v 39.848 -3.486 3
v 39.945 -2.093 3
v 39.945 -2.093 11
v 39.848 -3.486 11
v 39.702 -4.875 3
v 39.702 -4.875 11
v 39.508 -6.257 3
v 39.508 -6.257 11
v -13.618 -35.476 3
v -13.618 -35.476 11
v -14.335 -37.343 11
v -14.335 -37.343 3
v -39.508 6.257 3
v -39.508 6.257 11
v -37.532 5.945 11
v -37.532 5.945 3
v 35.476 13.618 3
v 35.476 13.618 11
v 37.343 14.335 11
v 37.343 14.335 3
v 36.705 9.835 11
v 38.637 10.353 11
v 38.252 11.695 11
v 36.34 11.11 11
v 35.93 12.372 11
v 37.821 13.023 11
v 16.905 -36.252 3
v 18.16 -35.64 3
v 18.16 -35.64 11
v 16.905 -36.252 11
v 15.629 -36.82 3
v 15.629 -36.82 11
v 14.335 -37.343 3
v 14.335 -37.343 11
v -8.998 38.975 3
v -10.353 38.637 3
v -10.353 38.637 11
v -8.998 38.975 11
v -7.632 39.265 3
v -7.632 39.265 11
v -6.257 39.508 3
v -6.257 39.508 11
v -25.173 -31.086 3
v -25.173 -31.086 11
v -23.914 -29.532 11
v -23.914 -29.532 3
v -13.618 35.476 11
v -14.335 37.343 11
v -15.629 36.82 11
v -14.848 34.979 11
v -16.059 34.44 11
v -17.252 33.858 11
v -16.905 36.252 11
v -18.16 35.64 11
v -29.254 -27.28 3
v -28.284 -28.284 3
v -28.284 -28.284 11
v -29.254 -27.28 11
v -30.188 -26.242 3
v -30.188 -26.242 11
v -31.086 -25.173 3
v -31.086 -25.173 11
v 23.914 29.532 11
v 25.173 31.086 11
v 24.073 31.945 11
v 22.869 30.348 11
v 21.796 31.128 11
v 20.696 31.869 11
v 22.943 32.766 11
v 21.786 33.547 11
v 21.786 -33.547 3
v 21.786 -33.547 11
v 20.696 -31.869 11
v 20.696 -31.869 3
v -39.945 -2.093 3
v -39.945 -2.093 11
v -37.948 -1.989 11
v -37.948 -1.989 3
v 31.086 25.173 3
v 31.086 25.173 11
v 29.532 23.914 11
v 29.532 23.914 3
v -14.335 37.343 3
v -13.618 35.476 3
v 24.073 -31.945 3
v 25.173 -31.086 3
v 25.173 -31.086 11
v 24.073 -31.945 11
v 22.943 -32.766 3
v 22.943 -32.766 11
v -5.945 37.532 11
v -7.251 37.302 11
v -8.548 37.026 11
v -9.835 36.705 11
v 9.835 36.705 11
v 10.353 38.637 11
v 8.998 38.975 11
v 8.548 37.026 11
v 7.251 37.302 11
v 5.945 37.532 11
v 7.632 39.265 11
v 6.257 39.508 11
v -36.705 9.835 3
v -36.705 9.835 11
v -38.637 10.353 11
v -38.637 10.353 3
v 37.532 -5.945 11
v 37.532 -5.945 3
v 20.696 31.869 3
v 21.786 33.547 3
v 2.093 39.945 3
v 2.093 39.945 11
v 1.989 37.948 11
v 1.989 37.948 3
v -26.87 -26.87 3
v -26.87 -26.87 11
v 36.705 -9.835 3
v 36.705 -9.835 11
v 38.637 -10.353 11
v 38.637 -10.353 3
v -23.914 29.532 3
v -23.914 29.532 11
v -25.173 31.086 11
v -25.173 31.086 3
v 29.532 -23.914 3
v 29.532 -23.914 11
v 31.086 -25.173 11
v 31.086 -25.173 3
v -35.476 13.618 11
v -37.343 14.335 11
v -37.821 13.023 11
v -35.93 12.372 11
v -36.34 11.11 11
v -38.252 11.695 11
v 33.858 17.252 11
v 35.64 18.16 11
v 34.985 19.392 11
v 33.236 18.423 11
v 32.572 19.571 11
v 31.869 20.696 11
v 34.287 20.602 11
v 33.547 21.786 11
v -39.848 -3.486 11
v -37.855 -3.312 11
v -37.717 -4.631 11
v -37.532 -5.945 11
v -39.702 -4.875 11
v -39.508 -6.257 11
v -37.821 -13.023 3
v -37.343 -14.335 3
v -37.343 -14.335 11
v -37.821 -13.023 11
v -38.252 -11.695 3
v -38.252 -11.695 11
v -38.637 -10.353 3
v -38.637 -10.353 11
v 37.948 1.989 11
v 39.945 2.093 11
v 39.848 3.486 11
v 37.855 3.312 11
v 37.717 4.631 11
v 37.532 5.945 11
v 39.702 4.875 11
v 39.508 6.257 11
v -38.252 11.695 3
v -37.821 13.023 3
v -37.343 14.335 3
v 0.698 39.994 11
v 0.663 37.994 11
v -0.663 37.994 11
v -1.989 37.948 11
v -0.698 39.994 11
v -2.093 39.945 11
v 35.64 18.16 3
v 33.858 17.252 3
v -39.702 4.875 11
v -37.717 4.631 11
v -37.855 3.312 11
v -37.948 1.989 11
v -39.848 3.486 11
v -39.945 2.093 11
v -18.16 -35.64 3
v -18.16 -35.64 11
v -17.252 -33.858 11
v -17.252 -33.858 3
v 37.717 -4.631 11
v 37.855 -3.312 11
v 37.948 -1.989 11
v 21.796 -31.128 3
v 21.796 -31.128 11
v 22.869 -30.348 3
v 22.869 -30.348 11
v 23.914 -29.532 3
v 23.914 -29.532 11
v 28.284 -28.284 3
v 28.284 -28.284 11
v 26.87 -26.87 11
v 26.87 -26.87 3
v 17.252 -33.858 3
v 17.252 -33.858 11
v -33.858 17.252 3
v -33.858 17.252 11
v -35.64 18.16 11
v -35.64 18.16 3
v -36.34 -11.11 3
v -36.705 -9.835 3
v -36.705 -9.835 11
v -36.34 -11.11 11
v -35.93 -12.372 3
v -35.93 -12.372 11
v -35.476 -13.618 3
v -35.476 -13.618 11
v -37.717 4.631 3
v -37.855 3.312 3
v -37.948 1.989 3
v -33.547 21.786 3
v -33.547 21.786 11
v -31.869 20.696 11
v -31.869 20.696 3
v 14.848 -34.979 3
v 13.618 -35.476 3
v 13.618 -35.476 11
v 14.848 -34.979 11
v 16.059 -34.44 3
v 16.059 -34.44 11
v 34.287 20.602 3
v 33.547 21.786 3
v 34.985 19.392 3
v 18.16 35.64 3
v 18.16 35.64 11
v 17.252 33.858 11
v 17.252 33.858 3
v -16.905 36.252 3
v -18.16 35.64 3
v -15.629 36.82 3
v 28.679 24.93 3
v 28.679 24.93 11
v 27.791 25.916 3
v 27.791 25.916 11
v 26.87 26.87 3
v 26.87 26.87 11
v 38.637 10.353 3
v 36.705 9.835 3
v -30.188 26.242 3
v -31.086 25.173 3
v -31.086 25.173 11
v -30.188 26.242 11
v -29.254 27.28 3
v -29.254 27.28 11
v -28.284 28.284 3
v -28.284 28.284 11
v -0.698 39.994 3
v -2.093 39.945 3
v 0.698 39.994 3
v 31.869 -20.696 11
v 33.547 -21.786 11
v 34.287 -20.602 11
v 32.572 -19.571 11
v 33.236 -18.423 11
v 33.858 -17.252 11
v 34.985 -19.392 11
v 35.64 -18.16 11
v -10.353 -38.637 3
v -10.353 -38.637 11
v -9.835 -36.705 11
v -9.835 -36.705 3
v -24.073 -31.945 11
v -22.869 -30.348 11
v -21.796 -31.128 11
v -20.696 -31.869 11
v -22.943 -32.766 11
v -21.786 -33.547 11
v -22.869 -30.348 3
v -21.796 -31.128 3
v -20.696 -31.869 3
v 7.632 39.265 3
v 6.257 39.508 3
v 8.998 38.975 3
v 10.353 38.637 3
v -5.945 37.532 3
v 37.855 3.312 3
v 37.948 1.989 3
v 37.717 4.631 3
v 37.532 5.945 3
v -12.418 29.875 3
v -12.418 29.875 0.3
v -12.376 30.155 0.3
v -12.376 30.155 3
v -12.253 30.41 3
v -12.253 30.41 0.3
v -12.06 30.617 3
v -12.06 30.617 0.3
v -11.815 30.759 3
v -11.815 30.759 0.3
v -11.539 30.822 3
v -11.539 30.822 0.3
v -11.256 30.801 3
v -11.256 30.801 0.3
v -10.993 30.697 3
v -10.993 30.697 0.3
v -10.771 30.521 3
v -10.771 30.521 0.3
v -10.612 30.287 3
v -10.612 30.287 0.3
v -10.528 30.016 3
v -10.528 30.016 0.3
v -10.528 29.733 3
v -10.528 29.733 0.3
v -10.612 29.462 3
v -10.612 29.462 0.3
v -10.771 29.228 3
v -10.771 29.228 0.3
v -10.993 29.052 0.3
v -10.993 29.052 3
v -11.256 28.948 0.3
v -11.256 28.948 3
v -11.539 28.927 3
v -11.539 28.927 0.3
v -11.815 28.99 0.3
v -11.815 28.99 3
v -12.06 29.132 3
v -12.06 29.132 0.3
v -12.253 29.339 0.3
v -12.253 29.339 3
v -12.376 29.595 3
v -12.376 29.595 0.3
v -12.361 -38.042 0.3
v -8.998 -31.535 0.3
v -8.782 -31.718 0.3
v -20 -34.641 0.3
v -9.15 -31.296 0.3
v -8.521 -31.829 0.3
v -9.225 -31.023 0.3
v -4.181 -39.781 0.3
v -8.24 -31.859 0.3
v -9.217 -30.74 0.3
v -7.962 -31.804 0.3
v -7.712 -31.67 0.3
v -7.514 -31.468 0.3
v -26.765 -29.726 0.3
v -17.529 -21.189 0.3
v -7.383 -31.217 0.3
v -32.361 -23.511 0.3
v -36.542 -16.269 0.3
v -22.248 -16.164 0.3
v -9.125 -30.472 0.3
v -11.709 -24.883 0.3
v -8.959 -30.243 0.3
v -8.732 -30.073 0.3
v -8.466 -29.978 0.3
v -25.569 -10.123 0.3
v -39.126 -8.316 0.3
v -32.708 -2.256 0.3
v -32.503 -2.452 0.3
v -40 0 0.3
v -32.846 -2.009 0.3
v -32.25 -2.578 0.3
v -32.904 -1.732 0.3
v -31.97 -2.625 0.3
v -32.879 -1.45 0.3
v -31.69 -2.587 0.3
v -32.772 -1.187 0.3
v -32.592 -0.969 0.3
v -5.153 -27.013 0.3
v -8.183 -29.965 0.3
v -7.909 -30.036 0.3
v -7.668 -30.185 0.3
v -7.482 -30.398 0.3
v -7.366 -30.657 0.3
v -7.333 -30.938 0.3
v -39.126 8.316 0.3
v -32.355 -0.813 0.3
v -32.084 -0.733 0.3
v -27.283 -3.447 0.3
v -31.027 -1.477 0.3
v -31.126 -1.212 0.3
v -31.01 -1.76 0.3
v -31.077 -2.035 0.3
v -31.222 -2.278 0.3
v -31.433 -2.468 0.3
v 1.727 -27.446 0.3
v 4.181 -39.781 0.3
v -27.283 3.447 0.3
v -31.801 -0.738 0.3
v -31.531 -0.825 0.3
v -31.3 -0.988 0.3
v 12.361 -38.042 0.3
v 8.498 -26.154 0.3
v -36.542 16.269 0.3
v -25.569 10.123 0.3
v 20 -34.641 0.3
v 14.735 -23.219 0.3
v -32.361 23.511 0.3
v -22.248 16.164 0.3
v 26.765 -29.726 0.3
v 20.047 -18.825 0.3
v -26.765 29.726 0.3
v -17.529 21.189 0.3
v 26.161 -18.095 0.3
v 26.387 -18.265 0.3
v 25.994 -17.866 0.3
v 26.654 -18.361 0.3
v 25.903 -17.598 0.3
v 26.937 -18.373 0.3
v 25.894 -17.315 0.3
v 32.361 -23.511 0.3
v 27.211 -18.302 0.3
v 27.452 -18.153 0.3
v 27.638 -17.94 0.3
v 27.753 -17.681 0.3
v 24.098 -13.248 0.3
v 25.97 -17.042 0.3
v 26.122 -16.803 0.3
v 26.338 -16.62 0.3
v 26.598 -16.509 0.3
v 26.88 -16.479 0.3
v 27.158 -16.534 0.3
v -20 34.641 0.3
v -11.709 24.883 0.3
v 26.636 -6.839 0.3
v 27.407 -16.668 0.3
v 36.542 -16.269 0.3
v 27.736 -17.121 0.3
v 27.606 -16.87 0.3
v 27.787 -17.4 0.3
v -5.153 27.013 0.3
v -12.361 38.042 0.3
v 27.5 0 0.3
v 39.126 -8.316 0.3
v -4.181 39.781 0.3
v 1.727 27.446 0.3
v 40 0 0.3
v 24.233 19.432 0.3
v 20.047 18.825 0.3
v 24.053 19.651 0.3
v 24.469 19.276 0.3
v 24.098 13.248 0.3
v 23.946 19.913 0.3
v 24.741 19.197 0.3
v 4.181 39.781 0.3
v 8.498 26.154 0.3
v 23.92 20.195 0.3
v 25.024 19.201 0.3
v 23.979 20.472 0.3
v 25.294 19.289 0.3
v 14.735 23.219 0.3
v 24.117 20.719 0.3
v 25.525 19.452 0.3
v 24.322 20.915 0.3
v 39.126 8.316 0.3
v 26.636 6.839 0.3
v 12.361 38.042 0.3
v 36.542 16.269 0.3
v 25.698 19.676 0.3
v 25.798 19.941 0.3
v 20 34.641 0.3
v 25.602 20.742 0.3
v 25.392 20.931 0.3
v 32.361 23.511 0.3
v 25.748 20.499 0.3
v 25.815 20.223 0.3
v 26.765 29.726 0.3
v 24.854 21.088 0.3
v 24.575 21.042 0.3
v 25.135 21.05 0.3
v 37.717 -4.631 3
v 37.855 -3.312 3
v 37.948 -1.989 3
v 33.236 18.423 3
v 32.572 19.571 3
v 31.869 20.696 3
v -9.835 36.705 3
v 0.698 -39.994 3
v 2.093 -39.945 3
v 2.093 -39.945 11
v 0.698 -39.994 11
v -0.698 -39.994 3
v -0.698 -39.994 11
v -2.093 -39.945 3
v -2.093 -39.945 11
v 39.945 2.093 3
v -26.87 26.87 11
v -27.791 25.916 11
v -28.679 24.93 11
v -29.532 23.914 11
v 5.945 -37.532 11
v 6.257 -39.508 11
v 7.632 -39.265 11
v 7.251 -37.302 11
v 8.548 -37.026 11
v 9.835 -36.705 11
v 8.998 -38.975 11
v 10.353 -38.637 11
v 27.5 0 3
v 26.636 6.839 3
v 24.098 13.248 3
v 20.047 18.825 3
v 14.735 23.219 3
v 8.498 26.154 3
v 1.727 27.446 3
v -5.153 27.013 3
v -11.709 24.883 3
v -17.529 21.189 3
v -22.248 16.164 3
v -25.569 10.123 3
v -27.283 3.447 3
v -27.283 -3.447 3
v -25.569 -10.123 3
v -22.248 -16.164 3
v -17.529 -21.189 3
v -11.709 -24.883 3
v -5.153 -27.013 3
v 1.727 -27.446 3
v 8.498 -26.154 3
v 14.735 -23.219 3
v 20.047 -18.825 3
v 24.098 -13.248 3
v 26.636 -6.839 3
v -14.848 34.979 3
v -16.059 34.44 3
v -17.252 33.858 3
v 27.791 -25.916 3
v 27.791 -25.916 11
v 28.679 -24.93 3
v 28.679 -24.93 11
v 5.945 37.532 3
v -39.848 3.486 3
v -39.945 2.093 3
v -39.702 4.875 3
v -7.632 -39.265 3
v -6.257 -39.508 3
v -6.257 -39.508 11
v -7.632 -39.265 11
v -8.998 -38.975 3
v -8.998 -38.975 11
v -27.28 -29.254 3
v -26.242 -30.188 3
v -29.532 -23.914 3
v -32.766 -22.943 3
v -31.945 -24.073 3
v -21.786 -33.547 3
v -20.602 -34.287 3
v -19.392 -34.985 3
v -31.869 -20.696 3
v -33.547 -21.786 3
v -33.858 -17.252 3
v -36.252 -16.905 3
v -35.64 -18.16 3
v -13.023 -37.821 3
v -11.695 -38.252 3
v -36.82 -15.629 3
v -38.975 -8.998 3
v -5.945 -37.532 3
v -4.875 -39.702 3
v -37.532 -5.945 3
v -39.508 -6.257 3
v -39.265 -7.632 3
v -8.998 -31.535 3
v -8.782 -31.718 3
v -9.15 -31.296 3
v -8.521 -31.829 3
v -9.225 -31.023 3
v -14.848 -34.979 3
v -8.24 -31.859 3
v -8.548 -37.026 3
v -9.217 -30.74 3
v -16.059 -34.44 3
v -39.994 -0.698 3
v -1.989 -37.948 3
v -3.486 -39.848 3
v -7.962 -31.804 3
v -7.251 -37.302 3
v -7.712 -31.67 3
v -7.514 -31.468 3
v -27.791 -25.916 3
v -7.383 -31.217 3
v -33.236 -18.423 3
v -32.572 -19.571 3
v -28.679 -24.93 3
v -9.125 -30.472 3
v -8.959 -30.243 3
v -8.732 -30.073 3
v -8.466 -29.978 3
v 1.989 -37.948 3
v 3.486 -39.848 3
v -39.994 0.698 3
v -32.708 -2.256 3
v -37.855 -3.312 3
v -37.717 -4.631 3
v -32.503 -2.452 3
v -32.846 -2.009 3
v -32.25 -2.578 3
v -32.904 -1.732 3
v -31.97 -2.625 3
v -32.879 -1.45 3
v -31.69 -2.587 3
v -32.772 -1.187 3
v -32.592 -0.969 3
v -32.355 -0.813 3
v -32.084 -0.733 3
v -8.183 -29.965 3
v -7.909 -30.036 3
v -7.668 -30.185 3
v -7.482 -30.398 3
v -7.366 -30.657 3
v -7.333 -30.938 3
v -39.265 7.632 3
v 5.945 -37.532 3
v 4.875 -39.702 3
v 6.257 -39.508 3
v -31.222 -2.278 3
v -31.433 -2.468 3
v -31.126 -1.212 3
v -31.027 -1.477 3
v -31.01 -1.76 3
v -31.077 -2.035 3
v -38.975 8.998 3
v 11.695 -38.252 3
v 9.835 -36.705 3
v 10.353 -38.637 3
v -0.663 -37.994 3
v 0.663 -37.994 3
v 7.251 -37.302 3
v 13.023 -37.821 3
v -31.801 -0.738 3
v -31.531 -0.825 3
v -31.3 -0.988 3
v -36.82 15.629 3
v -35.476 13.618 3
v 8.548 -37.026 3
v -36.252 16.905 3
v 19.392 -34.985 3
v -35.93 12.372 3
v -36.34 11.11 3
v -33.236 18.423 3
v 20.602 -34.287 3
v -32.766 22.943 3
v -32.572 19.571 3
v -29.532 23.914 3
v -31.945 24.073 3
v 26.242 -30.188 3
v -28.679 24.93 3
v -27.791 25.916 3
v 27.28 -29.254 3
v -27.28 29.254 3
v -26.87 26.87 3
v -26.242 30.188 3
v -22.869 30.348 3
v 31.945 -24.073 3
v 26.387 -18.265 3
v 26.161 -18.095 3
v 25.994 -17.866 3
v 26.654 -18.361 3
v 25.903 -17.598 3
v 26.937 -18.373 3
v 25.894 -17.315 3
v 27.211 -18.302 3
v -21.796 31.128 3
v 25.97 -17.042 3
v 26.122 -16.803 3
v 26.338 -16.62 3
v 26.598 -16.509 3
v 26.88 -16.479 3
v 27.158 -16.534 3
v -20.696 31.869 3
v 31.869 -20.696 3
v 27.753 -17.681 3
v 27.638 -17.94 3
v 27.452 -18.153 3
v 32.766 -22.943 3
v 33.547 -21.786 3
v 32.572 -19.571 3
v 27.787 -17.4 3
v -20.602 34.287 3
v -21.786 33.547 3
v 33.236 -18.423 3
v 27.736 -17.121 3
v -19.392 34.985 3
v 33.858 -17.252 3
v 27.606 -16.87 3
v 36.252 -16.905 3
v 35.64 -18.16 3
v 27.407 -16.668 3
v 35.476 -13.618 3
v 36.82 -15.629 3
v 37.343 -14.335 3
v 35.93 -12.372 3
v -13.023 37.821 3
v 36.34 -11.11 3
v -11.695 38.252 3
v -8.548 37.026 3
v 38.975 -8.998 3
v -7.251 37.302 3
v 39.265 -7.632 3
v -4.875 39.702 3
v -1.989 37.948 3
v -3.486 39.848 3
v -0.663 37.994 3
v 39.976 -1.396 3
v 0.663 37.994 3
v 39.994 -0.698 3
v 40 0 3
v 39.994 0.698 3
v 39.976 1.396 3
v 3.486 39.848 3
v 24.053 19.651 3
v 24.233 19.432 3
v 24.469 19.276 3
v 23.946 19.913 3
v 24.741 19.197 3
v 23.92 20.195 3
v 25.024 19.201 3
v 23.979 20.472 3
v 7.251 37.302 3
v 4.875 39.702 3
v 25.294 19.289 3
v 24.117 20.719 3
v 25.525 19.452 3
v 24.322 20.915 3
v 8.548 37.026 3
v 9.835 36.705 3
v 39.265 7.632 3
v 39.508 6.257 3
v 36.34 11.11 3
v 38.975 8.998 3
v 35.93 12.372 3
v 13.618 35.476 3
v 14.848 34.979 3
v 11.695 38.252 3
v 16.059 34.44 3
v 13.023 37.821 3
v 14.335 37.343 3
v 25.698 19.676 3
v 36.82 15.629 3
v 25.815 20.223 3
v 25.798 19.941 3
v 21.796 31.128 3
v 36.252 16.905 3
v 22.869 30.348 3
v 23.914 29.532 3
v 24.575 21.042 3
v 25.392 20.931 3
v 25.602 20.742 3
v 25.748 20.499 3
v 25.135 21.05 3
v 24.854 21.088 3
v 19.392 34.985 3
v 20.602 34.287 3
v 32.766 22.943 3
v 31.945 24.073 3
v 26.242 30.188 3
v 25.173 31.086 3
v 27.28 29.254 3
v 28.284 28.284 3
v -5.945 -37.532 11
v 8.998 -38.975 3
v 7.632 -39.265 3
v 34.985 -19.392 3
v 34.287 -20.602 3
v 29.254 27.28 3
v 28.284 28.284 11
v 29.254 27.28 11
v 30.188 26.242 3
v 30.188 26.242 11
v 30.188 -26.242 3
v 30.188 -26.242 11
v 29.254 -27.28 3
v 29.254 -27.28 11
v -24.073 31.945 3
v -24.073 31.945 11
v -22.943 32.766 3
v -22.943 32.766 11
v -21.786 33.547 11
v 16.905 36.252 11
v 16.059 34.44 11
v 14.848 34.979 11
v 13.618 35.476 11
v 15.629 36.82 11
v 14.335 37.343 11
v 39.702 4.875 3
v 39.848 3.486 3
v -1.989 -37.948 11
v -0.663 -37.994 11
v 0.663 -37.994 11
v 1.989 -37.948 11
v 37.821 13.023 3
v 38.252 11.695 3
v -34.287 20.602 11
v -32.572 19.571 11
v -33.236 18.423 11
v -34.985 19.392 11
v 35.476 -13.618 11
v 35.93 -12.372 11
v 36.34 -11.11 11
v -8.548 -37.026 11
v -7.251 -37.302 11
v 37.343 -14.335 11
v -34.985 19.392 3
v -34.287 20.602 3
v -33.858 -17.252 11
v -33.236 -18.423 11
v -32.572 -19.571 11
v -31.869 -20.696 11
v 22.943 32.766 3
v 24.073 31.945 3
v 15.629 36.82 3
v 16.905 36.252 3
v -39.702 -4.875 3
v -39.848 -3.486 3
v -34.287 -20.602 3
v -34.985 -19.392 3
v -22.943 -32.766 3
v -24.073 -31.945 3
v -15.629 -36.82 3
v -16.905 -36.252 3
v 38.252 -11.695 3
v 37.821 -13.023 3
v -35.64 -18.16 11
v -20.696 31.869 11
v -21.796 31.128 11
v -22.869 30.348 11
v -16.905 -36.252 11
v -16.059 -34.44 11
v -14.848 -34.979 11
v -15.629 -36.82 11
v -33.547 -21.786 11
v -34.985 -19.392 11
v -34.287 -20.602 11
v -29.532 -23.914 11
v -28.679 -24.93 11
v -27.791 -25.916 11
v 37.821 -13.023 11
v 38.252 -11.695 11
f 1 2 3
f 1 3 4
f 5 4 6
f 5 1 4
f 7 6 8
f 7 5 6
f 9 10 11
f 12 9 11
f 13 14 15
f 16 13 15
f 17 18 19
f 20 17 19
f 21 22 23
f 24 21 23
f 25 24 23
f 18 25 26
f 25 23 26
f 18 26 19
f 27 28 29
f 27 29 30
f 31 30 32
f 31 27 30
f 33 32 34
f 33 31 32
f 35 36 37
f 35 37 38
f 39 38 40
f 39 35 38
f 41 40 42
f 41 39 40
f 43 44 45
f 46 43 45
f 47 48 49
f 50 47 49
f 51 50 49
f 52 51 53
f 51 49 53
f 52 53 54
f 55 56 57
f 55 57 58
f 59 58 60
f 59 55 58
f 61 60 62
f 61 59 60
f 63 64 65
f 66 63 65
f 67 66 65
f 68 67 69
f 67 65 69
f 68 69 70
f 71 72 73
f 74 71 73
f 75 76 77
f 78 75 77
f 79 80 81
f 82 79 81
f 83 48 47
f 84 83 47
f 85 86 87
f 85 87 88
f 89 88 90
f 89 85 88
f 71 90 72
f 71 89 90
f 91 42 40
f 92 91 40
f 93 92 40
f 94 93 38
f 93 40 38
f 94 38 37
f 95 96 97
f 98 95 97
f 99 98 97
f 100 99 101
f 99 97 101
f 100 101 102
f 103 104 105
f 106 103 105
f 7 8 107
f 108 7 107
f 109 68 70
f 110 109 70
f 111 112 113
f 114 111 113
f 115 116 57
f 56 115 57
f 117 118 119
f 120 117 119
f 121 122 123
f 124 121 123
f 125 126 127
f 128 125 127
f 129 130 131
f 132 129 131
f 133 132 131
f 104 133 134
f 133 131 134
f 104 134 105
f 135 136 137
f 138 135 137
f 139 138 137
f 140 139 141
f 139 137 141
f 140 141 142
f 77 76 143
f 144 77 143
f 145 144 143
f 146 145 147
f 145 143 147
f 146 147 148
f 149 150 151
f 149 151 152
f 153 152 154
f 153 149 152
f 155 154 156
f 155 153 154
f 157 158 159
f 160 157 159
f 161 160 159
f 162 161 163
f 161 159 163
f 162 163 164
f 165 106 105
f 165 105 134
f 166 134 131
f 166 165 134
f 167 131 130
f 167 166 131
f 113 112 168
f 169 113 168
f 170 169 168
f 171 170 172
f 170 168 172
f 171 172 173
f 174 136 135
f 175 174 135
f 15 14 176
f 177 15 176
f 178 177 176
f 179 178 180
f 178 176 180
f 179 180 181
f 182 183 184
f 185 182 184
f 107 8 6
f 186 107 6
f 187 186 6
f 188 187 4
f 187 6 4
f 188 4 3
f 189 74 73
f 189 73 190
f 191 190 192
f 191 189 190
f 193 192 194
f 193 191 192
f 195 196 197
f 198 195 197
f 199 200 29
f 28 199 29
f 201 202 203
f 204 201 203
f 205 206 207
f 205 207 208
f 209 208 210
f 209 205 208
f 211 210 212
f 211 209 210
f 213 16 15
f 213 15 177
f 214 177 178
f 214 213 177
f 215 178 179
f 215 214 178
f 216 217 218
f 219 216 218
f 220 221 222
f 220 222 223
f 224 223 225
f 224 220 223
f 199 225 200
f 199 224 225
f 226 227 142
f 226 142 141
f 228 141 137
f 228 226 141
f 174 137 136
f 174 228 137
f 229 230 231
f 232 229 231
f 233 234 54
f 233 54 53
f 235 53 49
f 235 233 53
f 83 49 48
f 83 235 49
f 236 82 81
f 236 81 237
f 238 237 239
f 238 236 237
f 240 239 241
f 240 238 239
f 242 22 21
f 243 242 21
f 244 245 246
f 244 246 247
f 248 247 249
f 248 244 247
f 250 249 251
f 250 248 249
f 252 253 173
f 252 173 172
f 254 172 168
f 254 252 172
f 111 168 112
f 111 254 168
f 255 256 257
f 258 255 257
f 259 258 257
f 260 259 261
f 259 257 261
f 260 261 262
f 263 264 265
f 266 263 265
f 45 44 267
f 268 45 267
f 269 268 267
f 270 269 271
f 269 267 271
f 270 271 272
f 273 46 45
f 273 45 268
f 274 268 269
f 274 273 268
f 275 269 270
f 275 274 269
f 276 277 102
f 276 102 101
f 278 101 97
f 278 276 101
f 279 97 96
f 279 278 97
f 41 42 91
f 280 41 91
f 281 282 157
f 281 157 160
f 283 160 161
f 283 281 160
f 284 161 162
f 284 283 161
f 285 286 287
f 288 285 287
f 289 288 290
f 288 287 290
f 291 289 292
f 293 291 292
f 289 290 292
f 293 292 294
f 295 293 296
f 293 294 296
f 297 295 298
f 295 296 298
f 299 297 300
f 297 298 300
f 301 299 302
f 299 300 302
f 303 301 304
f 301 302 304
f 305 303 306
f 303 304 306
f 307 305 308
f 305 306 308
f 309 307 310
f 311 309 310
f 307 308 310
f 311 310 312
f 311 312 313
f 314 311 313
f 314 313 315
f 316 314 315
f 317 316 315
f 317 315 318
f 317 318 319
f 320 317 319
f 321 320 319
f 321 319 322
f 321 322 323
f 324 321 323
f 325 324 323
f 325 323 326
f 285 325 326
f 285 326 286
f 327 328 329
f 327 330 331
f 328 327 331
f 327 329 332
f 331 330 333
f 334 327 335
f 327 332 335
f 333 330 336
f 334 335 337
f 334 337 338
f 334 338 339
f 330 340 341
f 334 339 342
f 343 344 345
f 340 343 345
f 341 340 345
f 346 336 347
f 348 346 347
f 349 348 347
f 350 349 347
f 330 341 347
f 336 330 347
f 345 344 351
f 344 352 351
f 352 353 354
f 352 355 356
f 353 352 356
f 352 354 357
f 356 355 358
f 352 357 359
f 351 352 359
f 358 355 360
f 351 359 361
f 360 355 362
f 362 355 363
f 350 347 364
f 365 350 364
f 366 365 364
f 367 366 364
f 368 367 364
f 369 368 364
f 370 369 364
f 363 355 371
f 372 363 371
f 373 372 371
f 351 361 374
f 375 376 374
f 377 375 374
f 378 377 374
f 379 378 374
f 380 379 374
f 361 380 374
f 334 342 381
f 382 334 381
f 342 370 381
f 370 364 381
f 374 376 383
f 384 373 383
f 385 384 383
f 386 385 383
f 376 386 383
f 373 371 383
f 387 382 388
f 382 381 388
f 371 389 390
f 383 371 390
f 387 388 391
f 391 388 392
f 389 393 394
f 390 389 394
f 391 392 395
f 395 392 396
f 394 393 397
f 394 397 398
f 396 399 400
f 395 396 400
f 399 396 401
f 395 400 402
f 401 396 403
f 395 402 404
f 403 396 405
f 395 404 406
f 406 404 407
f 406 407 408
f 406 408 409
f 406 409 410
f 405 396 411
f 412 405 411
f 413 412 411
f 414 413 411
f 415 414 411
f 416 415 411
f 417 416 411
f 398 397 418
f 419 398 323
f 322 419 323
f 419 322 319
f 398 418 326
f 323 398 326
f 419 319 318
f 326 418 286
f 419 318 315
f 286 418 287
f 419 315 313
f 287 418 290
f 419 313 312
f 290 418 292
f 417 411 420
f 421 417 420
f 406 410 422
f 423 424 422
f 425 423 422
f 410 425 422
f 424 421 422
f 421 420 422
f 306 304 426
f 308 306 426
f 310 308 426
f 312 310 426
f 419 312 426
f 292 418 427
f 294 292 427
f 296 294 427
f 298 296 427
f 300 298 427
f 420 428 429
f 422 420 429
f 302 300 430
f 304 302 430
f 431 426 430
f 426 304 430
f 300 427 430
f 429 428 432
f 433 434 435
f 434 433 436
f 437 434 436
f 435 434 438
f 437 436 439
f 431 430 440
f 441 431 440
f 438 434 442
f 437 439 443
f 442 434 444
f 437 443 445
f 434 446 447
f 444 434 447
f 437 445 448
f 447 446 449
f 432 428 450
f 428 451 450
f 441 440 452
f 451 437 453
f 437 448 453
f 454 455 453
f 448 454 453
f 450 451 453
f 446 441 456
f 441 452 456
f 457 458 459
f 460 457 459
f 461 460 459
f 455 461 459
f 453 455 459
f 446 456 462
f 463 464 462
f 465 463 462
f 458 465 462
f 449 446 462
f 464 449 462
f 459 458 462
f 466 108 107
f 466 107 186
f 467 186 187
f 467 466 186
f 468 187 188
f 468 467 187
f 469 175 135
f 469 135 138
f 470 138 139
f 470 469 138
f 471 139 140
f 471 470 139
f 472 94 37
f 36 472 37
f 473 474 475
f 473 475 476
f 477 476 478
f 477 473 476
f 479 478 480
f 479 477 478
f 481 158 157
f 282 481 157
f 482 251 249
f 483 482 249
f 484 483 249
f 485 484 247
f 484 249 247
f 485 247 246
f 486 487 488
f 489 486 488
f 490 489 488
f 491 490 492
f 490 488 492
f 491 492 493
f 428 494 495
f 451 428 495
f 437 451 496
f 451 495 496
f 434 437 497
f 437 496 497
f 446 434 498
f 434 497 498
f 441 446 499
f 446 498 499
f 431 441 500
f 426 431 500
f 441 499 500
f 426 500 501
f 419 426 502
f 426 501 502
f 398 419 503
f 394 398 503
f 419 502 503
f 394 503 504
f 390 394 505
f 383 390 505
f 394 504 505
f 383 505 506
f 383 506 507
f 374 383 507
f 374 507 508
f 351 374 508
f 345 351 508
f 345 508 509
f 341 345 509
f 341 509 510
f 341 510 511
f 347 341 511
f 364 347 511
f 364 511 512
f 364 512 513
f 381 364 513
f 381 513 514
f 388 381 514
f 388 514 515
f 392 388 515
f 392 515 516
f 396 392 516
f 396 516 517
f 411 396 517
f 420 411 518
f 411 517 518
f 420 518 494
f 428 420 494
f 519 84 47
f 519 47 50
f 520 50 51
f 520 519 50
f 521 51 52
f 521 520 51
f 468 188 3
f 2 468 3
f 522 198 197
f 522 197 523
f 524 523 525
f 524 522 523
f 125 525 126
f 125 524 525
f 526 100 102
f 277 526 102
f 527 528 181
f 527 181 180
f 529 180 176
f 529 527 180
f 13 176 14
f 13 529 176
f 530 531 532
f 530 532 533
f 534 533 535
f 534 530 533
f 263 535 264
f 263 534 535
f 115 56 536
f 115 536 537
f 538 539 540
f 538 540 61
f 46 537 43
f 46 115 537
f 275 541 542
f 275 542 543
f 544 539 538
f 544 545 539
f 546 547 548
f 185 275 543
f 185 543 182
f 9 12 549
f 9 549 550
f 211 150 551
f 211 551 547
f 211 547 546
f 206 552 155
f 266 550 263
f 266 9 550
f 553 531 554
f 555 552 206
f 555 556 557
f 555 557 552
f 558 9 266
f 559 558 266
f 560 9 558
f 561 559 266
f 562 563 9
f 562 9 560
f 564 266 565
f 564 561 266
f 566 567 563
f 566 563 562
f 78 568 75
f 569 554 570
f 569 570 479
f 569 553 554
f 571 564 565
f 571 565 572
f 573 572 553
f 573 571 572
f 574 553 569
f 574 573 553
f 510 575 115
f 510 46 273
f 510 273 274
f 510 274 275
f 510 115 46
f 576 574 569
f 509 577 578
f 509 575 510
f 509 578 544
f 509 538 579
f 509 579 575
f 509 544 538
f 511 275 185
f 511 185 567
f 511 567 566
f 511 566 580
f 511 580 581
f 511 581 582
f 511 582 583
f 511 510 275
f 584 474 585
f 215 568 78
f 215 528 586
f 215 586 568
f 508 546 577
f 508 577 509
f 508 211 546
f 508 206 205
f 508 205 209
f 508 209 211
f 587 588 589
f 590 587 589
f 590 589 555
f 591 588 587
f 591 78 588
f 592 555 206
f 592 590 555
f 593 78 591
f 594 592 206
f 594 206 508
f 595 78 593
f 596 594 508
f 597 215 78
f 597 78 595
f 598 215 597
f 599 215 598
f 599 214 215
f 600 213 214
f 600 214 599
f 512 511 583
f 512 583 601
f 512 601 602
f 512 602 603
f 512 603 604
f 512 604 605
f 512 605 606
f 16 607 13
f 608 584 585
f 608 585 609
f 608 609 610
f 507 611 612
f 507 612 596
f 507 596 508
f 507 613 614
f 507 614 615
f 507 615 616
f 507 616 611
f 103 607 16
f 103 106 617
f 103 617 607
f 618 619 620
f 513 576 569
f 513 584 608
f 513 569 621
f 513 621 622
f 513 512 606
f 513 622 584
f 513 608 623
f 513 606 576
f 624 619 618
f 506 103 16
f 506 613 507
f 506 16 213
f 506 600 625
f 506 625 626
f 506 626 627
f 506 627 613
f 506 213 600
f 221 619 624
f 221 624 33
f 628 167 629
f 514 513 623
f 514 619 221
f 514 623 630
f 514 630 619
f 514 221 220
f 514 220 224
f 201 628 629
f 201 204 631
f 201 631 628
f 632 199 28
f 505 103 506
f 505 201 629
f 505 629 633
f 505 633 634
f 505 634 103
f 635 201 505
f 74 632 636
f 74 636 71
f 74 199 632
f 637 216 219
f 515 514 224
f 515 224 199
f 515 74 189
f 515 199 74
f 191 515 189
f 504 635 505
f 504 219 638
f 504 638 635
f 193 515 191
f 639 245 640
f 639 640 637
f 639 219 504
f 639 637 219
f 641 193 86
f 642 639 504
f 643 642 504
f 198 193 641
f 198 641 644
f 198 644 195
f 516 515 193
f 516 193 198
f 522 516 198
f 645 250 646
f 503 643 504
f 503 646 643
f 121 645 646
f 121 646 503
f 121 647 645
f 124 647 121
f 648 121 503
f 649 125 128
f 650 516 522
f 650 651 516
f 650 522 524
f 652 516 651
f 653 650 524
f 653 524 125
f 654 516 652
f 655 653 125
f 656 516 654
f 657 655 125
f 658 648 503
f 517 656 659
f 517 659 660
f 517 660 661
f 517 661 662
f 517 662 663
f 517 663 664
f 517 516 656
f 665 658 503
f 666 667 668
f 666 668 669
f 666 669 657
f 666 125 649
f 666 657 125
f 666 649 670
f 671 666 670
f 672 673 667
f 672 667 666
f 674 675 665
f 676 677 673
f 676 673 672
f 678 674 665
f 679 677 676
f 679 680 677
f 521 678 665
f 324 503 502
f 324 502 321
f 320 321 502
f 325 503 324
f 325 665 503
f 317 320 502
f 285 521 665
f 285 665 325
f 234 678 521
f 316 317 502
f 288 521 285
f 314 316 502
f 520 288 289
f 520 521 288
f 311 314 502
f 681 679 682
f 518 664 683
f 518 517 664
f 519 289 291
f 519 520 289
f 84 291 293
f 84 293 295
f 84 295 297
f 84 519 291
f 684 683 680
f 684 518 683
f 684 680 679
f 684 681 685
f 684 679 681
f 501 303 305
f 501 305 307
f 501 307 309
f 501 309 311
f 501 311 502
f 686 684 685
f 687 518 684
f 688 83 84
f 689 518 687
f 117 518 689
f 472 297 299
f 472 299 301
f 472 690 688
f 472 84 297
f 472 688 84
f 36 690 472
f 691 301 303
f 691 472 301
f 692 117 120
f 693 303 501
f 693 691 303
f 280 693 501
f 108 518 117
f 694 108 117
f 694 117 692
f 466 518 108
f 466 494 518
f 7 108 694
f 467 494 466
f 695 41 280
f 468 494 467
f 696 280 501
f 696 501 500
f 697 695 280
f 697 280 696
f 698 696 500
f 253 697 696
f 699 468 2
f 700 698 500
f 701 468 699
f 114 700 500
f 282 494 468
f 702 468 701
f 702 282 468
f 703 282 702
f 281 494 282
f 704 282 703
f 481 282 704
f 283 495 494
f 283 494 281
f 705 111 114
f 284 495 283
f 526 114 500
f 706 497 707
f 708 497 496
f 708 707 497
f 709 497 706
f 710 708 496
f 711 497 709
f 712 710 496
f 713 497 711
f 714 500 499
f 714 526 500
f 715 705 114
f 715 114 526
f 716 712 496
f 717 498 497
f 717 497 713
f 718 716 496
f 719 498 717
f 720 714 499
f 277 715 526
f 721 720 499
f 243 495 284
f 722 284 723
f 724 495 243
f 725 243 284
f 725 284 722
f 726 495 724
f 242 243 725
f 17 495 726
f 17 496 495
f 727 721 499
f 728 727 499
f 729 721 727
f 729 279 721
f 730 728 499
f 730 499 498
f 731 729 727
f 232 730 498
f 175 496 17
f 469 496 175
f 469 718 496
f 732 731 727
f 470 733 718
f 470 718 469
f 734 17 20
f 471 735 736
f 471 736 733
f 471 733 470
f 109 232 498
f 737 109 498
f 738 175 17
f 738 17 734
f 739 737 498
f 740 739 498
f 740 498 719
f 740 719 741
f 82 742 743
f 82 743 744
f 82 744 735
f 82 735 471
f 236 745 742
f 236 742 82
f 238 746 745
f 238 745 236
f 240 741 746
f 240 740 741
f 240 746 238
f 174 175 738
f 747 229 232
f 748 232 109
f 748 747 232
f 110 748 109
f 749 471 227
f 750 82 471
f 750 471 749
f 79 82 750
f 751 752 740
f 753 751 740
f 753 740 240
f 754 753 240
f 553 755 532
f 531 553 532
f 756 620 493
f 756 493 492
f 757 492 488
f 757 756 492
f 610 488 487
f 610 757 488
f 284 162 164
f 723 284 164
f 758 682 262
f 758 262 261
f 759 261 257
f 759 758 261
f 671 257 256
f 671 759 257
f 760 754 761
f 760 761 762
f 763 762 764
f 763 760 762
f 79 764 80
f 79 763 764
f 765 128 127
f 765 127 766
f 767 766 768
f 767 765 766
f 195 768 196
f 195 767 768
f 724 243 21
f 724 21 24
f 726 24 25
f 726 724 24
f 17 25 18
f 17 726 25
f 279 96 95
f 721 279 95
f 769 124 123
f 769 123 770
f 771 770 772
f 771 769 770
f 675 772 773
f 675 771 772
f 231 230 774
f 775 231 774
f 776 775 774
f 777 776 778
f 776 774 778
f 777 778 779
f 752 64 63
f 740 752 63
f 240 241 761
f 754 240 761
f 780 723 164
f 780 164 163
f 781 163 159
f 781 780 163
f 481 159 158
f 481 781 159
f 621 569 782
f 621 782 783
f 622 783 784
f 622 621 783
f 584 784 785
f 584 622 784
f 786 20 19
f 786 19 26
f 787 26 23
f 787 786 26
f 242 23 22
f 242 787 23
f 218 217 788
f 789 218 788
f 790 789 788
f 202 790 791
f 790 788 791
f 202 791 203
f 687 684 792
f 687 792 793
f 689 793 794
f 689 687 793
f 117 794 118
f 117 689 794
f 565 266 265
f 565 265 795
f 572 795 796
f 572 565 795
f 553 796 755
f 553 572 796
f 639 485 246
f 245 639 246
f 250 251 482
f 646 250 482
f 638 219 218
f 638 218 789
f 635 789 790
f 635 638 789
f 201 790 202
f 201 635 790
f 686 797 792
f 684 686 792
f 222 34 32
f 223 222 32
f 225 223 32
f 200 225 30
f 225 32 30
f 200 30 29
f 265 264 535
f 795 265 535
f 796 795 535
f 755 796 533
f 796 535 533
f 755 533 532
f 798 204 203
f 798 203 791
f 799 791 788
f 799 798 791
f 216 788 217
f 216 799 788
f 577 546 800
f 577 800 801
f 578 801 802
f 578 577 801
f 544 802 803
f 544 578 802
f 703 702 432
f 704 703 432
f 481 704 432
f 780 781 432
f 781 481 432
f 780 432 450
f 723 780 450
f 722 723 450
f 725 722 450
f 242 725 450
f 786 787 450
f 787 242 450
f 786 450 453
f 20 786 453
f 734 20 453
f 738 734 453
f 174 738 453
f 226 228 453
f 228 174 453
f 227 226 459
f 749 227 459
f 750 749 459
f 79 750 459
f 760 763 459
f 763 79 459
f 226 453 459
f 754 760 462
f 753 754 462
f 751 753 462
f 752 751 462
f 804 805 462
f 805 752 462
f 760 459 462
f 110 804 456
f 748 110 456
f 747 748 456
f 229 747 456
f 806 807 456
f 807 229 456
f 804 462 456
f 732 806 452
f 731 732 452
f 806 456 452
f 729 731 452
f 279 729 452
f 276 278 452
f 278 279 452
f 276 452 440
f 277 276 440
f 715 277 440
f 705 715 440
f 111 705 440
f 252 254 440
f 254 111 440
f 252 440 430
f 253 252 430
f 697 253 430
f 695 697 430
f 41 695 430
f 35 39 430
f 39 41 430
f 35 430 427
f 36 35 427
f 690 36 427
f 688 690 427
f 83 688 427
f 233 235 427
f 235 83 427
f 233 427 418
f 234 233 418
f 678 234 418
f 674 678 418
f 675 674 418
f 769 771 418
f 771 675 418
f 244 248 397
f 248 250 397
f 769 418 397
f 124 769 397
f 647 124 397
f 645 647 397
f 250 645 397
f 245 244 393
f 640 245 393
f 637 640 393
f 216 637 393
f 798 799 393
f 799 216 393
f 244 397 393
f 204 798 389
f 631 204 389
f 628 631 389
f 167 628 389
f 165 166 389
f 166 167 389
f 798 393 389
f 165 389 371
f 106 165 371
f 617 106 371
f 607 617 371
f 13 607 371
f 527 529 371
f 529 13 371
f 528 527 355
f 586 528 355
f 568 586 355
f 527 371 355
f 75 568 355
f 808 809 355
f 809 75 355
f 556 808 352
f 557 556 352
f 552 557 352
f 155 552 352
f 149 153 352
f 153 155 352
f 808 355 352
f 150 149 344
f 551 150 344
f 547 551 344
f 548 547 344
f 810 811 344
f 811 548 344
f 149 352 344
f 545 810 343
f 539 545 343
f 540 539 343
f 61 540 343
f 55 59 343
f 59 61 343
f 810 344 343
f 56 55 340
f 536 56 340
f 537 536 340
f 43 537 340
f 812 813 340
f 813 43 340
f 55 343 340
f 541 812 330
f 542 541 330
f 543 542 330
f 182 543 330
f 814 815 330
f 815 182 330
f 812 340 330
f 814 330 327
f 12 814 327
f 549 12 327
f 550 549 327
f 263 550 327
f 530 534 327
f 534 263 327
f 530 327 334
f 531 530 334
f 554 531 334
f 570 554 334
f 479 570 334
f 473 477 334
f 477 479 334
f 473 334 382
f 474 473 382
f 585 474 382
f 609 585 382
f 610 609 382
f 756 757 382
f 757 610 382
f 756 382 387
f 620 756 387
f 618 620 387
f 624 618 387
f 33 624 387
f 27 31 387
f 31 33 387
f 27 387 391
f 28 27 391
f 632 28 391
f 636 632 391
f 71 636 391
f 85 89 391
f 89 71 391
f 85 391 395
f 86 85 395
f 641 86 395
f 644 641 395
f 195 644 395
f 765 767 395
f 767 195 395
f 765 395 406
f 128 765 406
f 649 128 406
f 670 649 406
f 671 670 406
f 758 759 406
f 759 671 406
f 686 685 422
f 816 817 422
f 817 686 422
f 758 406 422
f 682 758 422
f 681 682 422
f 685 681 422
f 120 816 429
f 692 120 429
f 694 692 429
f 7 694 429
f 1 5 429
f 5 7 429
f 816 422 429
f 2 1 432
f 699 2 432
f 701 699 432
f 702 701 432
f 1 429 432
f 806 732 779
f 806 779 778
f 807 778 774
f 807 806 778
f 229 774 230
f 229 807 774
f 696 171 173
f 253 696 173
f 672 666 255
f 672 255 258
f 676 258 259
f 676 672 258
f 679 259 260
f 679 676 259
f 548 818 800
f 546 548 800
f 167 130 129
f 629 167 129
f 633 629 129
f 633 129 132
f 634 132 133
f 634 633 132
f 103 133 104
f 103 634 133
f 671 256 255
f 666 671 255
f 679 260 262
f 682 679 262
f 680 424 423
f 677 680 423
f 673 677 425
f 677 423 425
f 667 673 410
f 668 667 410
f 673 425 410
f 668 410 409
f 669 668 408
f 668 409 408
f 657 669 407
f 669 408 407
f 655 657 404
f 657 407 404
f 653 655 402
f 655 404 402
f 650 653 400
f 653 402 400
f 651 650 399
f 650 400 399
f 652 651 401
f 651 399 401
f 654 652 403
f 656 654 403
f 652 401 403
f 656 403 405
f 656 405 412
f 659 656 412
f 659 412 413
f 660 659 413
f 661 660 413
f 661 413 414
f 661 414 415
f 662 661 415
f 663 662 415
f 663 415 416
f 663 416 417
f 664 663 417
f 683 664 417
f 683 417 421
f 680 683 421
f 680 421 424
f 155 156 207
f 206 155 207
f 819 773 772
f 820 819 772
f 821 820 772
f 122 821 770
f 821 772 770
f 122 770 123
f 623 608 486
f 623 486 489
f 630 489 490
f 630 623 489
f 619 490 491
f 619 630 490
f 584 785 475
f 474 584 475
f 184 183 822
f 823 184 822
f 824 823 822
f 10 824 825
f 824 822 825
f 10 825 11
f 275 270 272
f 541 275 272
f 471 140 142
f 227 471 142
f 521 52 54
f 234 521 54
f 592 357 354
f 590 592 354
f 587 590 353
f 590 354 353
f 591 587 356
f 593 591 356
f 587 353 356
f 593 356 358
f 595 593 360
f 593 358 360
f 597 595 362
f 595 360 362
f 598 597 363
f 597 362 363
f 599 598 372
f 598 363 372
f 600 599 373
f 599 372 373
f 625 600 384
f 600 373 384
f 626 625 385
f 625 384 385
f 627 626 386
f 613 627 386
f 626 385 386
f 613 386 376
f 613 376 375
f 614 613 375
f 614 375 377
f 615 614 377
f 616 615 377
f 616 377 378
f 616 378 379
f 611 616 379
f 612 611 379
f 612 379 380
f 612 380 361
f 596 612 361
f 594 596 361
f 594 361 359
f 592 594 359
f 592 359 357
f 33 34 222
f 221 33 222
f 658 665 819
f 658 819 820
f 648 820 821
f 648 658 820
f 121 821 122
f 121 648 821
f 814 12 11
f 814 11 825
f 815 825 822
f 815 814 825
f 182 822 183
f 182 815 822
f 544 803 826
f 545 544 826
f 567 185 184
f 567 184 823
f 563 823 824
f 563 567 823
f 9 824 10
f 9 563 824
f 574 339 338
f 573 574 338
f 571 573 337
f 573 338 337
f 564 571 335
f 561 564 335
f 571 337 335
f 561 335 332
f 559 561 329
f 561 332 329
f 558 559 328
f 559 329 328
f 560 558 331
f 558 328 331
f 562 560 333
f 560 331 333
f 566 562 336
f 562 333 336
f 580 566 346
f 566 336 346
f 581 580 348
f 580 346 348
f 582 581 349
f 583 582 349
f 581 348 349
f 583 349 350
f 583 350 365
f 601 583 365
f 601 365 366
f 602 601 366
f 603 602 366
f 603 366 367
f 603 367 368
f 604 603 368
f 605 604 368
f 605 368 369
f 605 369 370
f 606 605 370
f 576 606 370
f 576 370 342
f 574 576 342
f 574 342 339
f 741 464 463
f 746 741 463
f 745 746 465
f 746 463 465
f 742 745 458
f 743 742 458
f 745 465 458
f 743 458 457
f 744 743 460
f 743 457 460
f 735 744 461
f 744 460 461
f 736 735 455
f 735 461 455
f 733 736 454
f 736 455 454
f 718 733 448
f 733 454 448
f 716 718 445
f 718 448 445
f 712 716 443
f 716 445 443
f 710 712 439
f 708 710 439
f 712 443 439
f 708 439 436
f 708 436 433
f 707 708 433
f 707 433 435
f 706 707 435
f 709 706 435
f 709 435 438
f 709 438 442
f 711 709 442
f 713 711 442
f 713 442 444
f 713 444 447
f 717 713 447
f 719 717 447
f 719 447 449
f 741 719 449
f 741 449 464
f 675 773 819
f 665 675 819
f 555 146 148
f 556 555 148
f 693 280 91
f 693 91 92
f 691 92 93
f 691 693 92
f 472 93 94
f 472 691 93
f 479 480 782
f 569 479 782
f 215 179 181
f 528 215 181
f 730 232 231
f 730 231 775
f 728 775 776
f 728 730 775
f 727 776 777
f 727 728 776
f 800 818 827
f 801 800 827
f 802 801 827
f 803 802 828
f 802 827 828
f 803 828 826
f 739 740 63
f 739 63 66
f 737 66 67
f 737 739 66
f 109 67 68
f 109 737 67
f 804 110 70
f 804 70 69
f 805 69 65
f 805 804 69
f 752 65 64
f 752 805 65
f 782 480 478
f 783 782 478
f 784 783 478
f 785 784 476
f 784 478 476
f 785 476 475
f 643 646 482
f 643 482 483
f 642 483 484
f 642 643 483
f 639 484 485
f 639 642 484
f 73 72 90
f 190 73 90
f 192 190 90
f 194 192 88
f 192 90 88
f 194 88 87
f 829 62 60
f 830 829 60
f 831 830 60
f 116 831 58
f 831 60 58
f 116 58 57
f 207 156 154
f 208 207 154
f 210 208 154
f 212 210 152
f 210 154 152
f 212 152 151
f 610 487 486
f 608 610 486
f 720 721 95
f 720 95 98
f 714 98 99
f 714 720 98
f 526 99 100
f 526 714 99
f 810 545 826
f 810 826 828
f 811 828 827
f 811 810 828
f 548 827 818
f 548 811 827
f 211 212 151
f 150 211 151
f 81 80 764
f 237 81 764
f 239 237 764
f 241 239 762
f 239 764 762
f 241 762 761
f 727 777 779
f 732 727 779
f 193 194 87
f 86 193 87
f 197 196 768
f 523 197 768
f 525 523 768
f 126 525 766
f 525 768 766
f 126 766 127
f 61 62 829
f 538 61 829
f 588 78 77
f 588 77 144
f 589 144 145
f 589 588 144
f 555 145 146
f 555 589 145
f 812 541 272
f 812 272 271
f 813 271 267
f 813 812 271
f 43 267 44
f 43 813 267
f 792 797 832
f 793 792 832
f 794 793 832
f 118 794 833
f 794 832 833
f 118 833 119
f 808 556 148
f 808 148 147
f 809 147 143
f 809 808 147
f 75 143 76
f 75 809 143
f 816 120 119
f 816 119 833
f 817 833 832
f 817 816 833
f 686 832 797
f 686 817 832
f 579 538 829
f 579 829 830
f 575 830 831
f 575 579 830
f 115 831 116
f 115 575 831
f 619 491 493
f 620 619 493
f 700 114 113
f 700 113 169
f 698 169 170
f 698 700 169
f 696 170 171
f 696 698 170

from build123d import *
from build123d.topology import SkipClean

# Parameters (mm, degrees)
SKETCH1_R           = 40
BOSS_EXTRUDE1_DEPTH = 3
SKETCH2_R           = 27.5
CUT_EXTRUDE1_DEPTH  = 57.648036153
MOVE_FACE1_BY       = 0.3
SKETCH6_R           = 0.95
CUT_EXTRUDE8_DEPTH  = 57.632940944
CIRPATTERN3_COUNT   = 5
BOSS_EXTRUDE2_DEPTH = 8
CIRPATTERN4_COUNT   = 30


with BuildPart() as part:
    # Sketch1 → Boss-Extrude1 (new body)
    with BuildSketch(Plane.XY):
        Circle(SKETCH1_R)
    extrude(amount=BOSS_EXTRUDE1_DEPTH)

    # Sketch2 → Cut-Extrude1 (cut, through all)
    with BuildSketch(Plane.XY.offset(3)):
        Circle(SKETCH2_R)
    extrude(amount=-CUT_EXTRUDE1_DEPTH, mode=Mode.SUBTRACT)

    # Move Face1: a face moved inward by 0.3
    extrude(part.faces().sort_by_distance((0, -32, 0))[0], amount=MOVE_FACE1_BY, dir=(0, 0, 1), mode=Mode.SUBTRACT)

    # Sketch6 → Cut-Extrude8 (cut, through all)
    with BuildSketch(Plane(origin=(0, 0, 0.3), x_dir=(-1, 0, 0), z_dir=(0, 0, -1))):
        with Locations((11.467774385, 29.874573648)):
            Circle(SKETCH6_R)
    cut_extrude8 = extrude(amount=-CUT_EXTRUDE8_DEPTH, mode=Mode.SUBTRACT)

    # CirPattern3: Cut-Extrude8 ×5 about axis
    cirpattern3_axis = Axis((0, 0, -88.99), (0, 0, 1))
    for i in range(1, CIRPATTERN3_COUNT):
        add(cut_extrude8.rotate(cirpattern3_axis, i * 360 / CIRPATTERN3_COUNT), mode=Mode.SUBTRACT)

    # Sketch7 → Boss-Extrude2 (add)
    with SkipClean():  # the faces are left unmerged after this step: merging them gives an invalid solid
        with BuildSketch(Plane.XY.offset(3)):
            with BuildLine():
                Line((-1.988766337, 37.947922321), (-2.09343825, 39.94518139))
                ThreePointArc((-2.09343825, 39.94518139), (0, 40), (2.09343825, 39.94518139))
                Line((2.09343825, 39.94518139), (1.988766337, 37.947922321))
                ThreePointArc((1.988766337, 37.947922321), (0, 38), (-1.988766337, 37.947922321))
            make_face()
        boss_extrude2 = extrude(amount=BOSS_EXTRUDE2_DEPTH)

    # CirPattern4: Boss-Extrude2 ×30 about axis
    with SkipClean():  # the faces are left unmerged after this step: merging them gives an invalid solid
        cirpattern4_axis = Axis((0, 0, -88.99), (0, 0, 1))
        for i in range(1, CIRPATTERN4_COUNT):
            add(boss_extrude2.rotate(cirpattern4_axis, i * 360 / CIRPATTERN4_COUNT))


solid = part.part
